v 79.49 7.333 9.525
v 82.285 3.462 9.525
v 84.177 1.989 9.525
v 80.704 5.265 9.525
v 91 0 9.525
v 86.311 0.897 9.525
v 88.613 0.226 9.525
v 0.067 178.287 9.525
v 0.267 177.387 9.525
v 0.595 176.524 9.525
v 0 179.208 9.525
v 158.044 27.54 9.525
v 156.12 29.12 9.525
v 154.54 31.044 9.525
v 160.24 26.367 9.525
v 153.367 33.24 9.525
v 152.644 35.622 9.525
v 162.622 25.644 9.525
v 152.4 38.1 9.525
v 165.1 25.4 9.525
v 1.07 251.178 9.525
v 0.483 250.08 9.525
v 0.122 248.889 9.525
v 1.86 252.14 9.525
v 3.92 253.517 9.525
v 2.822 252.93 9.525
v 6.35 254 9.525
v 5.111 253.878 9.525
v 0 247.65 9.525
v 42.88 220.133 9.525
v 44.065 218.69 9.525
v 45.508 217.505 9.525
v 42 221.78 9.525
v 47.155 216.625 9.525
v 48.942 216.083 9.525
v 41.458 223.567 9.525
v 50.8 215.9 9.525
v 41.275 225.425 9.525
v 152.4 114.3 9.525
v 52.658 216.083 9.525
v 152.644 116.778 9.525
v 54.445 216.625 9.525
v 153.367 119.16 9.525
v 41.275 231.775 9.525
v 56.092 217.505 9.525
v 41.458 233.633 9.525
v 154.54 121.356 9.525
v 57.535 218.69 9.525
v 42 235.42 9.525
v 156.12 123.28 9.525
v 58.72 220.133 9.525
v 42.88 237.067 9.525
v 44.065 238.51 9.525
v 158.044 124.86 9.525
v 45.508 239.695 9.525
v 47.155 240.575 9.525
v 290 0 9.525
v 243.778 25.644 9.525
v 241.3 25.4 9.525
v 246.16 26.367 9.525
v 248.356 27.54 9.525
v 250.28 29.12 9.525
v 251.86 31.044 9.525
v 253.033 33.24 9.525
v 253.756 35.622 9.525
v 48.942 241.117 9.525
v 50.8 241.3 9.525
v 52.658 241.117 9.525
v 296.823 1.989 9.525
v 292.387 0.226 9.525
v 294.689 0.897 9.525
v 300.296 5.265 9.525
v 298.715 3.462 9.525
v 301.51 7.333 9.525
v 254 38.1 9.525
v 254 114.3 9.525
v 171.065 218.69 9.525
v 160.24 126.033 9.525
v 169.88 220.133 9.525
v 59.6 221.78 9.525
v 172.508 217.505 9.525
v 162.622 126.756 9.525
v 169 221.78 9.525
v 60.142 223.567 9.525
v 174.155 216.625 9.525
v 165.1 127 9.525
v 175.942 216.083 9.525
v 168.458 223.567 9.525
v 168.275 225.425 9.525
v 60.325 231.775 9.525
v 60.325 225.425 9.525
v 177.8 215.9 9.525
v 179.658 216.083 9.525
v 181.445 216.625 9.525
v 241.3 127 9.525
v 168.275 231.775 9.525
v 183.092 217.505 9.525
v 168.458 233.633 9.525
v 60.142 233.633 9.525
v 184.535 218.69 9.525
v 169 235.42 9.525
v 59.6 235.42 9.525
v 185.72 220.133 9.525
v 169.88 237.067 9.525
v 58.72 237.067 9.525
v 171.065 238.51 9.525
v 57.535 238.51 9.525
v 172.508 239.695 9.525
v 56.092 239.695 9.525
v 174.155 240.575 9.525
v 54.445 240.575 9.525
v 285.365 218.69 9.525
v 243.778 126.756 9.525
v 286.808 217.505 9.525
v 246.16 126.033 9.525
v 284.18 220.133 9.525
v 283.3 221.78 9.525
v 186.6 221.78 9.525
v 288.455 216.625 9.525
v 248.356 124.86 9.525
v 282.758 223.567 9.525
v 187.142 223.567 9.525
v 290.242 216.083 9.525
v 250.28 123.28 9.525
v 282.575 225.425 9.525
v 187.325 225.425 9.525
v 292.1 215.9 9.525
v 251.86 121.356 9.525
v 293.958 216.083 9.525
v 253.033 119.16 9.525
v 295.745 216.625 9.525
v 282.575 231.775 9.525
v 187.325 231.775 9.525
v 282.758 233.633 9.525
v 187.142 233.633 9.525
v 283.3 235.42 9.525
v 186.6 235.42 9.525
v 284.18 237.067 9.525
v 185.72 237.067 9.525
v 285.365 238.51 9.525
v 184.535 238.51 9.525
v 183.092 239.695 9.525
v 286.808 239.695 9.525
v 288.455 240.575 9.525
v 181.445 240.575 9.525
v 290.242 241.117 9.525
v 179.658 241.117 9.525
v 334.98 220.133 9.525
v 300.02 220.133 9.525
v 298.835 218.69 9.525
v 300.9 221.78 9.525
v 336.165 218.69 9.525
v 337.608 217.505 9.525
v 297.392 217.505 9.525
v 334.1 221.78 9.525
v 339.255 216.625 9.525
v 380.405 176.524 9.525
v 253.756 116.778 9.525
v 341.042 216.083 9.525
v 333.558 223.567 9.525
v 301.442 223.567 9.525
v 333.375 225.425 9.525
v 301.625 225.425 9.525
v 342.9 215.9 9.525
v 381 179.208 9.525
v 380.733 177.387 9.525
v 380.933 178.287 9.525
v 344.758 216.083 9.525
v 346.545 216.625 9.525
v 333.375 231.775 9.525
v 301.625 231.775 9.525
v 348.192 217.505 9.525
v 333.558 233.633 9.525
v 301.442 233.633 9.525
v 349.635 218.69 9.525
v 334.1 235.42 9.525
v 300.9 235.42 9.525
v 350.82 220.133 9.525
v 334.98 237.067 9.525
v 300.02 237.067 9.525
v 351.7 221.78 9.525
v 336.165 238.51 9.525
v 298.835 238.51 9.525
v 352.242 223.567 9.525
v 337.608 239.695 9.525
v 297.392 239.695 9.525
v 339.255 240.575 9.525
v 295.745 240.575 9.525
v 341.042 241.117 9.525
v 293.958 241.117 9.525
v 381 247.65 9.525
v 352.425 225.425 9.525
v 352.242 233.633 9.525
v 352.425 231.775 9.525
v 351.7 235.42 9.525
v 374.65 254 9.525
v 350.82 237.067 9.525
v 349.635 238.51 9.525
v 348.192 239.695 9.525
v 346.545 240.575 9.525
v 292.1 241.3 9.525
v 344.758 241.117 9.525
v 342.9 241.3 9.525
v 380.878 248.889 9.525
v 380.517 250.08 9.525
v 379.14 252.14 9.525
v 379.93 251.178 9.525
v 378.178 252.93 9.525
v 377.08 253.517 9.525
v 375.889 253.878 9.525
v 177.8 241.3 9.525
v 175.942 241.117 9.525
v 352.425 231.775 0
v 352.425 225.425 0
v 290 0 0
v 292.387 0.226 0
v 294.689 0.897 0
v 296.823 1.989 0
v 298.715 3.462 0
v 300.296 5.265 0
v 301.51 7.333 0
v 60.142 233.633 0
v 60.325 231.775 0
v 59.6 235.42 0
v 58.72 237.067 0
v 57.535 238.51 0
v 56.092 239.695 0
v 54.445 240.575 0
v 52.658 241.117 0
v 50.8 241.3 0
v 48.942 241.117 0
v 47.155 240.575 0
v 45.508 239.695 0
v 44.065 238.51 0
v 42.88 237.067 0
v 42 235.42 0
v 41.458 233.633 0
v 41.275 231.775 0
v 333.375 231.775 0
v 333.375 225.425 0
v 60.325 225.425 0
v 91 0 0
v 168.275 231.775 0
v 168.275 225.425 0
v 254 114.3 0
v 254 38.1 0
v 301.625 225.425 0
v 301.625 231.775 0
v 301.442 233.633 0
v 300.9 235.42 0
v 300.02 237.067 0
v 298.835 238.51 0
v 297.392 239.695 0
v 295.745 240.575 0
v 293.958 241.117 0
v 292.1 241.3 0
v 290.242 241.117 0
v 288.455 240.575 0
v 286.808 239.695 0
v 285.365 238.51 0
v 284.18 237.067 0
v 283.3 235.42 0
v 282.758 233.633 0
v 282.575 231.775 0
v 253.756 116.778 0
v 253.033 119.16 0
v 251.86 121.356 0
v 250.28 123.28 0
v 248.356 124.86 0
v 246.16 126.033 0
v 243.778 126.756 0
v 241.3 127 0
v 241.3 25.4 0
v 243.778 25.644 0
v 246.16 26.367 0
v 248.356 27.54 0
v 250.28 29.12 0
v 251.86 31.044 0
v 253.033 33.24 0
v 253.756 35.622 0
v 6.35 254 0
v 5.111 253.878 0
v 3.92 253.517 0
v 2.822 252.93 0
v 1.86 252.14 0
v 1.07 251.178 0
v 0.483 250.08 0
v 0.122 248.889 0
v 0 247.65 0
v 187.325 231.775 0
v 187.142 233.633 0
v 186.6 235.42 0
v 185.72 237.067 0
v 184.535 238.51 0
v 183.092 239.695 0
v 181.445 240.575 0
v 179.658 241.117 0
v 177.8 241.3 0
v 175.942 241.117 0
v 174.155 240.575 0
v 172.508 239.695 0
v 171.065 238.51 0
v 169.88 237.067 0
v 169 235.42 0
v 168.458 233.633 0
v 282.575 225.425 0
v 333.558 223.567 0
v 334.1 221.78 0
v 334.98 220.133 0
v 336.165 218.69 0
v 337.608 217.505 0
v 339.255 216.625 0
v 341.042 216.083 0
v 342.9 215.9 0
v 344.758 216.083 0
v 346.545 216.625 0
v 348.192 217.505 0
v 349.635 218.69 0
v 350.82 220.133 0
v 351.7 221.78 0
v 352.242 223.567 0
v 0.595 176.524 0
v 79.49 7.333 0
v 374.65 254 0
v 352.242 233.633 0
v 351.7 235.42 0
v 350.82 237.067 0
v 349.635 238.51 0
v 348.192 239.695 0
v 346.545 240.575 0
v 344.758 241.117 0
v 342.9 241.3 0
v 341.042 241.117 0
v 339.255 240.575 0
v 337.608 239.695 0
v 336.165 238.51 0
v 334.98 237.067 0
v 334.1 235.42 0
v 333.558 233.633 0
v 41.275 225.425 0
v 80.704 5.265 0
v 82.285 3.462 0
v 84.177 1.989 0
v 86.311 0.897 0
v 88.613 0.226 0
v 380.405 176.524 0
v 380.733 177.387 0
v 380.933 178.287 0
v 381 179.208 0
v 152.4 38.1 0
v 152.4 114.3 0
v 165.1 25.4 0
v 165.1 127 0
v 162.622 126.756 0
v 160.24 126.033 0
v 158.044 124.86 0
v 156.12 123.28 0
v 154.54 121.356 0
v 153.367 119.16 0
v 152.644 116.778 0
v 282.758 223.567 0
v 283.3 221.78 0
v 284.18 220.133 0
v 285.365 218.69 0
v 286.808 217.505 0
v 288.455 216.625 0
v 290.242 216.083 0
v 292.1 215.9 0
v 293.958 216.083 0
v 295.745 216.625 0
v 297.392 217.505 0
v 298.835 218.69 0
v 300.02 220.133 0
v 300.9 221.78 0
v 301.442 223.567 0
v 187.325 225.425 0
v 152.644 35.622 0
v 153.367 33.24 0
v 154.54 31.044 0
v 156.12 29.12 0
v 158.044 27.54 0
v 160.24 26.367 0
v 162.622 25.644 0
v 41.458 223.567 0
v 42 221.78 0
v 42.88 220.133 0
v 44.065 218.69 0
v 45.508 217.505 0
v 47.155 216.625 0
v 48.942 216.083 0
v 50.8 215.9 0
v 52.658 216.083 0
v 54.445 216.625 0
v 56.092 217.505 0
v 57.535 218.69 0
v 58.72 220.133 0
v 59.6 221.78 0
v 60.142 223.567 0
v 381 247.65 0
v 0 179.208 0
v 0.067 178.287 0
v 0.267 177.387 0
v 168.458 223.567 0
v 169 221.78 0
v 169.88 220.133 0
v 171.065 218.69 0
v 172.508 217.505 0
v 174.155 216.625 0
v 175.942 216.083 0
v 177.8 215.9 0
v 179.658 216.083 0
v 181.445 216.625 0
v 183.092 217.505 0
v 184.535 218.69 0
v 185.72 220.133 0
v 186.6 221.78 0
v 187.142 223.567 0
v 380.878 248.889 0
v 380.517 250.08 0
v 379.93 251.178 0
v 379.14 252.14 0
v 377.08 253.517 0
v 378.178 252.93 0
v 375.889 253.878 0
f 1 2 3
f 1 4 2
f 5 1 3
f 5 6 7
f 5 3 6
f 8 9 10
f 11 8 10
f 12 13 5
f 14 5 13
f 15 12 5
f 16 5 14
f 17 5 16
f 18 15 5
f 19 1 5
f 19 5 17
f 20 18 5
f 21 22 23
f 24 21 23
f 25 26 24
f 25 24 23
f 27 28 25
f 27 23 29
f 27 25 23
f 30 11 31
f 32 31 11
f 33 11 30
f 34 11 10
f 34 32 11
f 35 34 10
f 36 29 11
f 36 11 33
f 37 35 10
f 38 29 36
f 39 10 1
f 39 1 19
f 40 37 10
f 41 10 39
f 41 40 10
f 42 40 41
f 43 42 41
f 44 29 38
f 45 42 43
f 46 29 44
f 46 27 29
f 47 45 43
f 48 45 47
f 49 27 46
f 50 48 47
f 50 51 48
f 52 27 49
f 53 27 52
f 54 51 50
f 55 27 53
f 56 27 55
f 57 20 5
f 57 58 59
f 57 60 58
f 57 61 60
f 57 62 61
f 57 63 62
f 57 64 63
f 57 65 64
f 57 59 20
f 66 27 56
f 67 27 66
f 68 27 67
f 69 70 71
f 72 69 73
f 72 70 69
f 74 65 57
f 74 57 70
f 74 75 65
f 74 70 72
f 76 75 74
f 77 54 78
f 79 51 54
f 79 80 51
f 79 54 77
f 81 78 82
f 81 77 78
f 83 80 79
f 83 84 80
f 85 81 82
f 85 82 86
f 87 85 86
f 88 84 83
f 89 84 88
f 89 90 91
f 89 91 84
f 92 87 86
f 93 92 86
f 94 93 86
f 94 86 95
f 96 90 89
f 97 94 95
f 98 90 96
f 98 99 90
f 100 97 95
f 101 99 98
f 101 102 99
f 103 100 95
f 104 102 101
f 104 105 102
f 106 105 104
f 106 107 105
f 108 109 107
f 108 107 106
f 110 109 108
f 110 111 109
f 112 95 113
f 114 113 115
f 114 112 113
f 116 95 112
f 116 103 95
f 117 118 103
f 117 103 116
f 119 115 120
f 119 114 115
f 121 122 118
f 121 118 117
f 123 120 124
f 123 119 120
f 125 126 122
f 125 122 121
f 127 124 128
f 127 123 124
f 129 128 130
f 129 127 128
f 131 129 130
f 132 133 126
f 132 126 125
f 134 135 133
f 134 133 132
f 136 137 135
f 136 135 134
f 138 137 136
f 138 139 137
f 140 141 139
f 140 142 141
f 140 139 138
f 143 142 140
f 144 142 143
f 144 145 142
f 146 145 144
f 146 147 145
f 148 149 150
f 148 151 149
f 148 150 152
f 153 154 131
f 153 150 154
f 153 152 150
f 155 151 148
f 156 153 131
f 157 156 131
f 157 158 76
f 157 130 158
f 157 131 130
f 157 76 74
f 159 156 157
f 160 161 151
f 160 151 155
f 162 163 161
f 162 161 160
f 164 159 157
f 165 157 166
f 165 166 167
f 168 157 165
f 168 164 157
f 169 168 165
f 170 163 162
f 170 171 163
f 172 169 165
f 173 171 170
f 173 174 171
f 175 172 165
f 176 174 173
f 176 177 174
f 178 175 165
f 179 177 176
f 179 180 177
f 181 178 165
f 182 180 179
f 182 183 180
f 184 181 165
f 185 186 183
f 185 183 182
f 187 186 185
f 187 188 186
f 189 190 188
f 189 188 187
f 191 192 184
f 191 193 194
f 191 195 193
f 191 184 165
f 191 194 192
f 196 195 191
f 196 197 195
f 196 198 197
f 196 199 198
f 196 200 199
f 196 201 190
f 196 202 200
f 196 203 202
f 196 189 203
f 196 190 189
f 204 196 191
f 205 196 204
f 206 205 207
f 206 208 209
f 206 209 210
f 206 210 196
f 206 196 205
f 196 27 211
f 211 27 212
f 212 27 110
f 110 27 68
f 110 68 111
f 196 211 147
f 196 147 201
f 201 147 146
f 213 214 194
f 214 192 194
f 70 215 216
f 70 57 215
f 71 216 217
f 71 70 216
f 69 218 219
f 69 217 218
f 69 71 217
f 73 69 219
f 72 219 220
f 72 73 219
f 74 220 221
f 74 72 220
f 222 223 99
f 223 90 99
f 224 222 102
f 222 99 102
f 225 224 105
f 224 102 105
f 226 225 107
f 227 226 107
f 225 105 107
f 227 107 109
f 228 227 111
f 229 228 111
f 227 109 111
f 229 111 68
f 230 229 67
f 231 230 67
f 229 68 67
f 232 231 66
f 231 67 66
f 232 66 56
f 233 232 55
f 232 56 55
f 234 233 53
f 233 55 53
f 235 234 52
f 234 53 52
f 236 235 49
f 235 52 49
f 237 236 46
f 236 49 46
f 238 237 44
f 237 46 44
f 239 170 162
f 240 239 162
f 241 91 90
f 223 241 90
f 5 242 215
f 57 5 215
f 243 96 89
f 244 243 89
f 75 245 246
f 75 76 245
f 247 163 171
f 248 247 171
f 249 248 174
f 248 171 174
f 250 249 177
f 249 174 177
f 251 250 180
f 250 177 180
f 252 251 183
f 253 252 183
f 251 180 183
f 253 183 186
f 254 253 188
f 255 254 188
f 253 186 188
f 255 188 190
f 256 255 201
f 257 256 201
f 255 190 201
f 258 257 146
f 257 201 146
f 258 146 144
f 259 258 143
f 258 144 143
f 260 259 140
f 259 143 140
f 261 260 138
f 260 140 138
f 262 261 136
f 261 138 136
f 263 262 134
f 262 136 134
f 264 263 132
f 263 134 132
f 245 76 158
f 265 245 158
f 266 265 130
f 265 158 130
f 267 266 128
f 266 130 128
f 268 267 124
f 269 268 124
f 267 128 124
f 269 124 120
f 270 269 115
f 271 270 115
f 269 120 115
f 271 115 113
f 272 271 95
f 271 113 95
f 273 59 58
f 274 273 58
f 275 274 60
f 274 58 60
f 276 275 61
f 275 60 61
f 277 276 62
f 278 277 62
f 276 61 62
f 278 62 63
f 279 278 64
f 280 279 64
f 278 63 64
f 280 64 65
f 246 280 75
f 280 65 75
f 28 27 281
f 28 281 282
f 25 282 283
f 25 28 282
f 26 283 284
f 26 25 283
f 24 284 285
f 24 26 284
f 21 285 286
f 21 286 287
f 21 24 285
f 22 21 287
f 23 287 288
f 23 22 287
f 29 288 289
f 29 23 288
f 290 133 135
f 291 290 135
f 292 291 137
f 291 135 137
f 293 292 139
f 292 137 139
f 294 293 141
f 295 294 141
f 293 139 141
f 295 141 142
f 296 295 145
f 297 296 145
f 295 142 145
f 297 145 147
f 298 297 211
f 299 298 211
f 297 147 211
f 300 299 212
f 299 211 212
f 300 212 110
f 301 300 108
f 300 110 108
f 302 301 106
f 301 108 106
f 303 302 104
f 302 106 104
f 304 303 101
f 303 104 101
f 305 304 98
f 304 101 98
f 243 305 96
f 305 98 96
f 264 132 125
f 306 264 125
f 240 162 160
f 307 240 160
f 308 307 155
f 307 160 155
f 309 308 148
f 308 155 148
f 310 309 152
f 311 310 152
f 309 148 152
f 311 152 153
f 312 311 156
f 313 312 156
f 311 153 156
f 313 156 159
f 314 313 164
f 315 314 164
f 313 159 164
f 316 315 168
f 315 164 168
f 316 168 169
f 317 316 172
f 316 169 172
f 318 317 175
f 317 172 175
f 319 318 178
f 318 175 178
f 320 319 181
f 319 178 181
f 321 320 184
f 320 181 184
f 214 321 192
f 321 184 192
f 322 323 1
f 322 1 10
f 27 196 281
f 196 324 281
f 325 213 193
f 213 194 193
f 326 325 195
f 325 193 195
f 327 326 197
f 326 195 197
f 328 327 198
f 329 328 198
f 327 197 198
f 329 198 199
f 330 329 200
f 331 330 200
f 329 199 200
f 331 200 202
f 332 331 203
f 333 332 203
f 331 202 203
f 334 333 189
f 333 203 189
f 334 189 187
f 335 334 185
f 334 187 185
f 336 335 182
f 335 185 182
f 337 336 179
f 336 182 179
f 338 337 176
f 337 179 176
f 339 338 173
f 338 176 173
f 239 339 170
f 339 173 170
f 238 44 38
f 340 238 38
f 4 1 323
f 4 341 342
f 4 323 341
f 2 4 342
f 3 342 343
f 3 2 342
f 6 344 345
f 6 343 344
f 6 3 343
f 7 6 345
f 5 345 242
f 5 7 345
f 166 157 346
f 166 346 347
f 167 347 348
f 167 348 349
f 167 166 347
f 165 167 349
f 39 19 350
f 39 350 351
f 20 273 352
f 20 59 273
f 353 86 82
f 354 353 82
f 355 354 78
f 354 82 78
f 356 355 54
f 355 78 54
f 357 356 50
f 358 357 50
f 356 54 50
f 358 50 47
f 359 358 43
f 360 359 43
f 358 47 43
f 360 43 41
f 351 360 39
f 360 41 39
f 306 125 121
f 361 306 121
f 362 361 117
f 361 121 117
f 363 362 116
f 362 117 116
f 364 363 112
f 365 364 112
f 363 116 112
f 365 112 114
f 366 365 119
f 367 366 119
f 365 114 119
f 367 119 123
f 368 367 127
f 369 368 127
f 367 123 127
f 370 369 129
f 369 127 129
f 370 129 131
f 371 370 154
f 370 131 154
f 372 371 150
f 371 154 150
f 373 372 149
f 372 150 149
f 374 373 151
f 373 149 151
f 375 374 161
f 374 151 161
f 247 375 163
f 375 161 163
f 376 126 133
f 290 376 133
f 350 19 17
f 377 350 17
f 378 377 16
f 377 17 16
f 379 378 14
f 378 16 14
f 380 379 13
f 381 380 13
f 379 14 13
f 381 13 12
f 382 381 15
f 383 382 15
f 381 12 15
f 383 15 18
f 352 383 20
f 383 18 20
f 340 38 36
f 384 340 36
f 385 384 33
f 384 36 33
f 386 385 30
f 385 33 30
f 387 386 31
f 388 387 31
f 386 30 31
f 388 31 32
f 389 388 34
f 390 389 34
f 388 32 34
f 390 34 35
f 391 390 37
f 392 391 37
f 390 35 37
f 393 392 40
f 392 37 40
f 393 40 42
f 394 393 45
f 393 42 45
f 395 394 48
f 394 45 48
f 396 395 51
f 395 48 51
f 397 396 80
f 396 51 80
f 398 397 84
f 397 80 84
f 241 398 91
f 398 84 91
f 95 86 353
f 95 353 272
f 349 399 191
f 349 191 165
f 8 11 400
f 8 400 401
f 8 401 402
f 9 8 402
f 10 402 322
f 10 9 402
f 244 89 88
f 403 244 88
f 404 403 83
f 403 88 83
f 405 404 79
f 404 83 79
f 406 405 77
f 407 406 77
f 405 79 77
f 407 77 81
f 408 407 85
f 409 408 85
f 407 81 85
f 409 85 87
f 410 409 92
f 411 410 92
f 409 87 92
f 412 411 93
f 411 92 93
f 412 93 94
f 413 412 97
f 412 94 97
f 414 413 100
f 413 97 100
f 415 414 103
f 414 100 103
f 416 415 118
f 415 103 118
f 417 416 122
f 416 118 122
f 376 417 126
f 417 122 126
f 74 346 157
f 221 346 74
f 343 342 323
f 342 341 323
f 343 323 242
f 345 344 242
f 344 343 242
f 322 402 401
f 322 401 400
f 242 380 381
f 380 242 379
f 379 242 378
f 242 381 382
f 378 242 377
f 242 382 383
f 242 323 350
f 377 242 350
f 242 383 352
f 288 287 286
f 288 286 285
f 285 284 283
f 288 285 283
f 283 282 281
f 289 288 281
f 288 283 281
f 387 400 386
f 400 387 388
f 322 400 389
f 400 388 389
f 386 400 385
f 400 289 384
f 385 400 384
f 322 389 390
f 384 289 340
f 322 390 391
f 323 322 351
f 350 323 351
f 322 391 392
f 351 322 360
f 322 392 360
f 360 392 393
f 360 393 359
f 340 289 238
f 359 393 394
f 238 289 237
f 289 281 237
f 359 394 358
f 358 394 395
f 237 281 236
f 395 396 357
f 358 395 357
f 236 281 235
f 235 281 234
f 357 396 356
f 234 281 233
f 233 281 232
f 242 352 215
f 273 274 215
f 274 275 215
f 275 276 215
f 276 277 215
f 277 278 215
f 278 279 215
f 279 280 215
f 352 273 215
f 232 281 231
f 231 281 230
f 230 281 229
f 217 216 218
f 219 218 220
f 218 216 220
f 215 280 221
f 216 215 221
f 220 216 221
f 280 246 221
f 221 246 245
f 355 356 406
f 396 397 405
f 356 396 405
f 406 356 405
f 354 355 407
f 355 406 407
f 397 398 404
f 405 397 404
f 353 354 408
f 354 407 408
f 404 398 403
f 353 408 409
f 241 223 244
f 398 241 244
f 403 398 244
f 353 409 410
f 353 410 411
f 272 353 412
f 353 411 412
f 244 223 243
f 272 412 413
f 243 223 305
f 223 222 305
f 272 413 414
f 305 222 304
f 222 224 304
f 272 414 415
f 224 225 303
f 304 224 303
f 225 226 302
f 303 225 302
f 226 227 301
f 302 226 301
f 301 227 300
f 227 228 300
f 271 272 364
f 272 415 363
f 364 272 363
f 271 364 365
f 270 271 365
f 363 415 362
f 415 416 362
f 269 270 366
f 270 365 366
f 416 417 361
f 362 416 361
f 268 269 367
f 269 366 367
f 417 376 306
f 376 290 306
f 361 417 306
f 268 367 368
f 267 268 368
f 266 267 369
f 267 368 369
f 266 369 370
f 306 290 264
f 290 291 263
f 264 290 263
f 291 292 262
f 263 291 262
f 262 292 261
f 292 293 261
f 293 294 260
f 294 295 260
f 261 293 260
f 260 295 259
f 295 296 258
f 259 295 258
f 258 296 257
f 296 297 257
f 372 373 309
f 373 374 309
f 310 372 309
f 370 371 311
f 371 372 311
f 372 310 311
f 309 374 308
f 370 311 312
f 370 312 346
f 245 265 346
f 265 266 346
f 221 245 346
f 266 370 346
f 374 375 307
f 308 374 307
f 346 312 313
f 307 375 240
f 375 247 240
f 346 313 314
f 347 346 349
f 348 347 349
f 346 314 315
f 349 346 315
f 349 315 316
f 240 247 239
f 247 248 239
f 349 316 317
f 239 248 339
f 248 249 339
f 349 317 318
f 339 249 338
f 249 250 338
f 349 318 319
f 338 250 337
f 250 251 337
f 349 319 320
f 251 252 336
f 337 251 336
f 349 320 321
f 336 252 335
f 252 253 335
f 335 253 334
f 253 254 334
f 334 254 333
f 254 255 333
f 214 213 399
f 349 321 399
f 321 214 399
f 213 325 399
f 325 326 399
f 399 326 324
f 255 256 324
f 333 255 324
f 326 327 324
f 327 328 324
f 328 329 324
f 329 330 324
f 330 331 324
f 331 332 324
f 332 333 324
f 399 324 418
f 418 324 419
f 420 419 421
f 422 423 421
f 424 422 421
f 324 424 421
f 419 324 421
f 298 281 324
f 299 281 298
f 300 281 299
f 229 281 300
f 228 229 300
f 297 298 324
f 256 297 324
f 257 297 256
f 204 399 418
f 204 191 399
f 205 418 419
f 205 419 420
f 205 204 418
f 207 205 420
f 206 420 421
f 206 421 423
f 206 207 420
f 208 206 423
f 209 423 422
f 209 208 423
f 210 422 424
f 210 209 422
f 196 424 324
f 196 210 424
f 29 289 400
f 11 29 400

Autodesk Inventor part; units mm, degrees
ref_plane "YZ Plane" through (0, 0, 0) normal (1, 0, 0) x (0, 1, 0)
ref_plane "XZ Plane" through (0, 0, 0) normal (0, 1, 0) x (-1, 0, 0)
ref_plane "XY Plane" through (0, 0, 0) normal (0, 0, 1) x (1, 0, 0)
sketch "Sketch1" plane through (0, 0, 0) normal (0, 0, 1) x (1, 0, 0)
  line L0 (0, 0) -> (298.0905, 0) construction
  line L1 (381, 254) -> (0, 254)
  line L2 (0, 254) -> (0, 0) construction
  line L3 (0, 254) -> (0, 0) construction
  line L4 (381, 254) -> (381, 177.8)
  line L5 (381, 177.8) -> (298.0905, 0)
  line L6 (0, 254) -> (0, 177.8)
  line L7 (82.9095, 0) -> (0, 177.8)
  line L8 (82.9095, 0) -> (298.0905, 0)
  dimension "d42" = 254
  dimension "d79" = 381
  dimension "d97" = 65
  dimension "d98" = 76.2
  dimension "d99" = 25
extrude "Plate1" add sketch "Sketch1" along normal blind 9.525
fillet "Corner Round1" radius 12.7 2 edges at (298.0905, 0, 4.7625) (82.9095, 0, 4.7625)
ref_plane "Work Plane1" through (0, 177.8, -13.208) normal (0, 1, 0) x (1, 0, 0)
sketch "Sketch10" plane through (0, 177.8, 9.525) normal (0, 0, 1) x (1, 0, 0)
  line L0 (342.9, 53.975) -> (342.9, 47.625) construction
  line L1 (333.375, 53.975) -> (333.375, 47.625)
  line L2 (352.425, 47.625) -> (352.425, 53.975)
  arc A0 (352.425, 53.975) -> (333.375, 53.975) centre (342.9, 53.975) ccw
  arc A1 (333.375, 47.625) -> (352.425, 47.625) centre (342.9, 47.625) ccw
  line L3 (50.8, 53.975) -> (50.8, 47.625) construction
  line L4 (41.275, 53.975) -> (41.275, 47.625)
  line L5 (60.325, 47.625) -> (60.325, 53.975)
  arc A2 (60.325, 53.975) -> (41.275, 53.975) centre (50.8, 53.975) ccw
  arc A3 (41.275, 47.625) -> (60.325, 47.625) centre (50.8, 47.625) ccw
  line L6 (0, 76.2) -> (381, 76.2) projected
  line L7 (381, 76.2) -> (381, 0) projected
  arc A4 (282.575, 47.625) -> (301.625, 47.625) centre (292.1, 47.625) ccw
  line L8 (282.575, 53.975) -> (282.575, 47.625)
  arc A5 (301.625, 53.975) -> (282.575, 53.975) centre (292.1, 53.975) ccw
  line L9 (301.625, 47.625) -> (301.625, 53.975)
  arc A6 (187.325, 53.975) -> (168.275, 53.975) centre (177.8, 53.975) ccw
  line L10 (187.325, 47.625) -> (187.325, 53.975)
  arc A7 (168.275, 47.625) -> (187.325, 47.625) centre (177.8, 47.625) ccw
  line L11 (168.275, 53.975) -> (168.275, 47.625)
  line L12 (0, 0) -> (0, 76.2) projected
  point P0 (342.9, 50.8)
  point P1 (50.8, 50.8)
  point P2 (41.275, 50.8)
  point P3 (168.275, 50.8)
  dimension "d83" = 19.05
  dimension "d85" = 6.35
  dimension "d100" = 25.4
  dimension "d101" = 38.1
  dimension "d104" = 50.8
  dimension "d111" = 127
  dimension "d116" = 50.8
extrude "Cut4" cut sketch "Sketch10" against normal blind 9.525
sketch "Sketch11" plane through (0, 0, 9.525) normal (0, 0, 1) x (1, 0, 0)
  line L0 (165.1, 127) -> (241.3, 127)
  line L1 (254, 114.3) -> (254, 38.1)
  line L2 (241.3, 25.4) -> (165.1, 25.4)
  line L3 (152.4, 38.1) -> (152.4, 114.3)
  line L4 (152.4, 127) -> (254, 25.4) construction
  line L5 (254, 127) -> (152.4, 25.4) construction
  arc A0 (254, 114.3) -> (241.3, 127) centre (241.3, 114.3) ccw
  arc A1 (165.1, 127) -> (152.4, 114.3) centre (165.1, 114.3) ccw
  arc A2 (152.4, 38.1) -> (165.1, 25.4) centre (165.1, 38.1) ccw
  arc A3 (241.3, 25.4) -> (254, 38.1) centre (241.3, 38.1) ccw
  line L6 (289.9997, 0) -> (0, 0) projected
  line L7 (0, 0) -> (0, 254) projected
  point P0 (203.2, 76.2)
  point P1 (12.7, 0)
  point P2 (0, 12.7)
  point P3 (0, 155.067)
  dimension "d90" = 101.6
  dimension "d91" = 101.6
  dimension "d92" = 12.7
  dimension "d93" = 25.4
  dimension "d94" = 152.4
extrude "Cut5" cut sketch "Sketch11" against normal blind 9.525
fillet "Corner Round4" radius 6.35 4 edges at (381, 254, 4.7625) (381, 177.8, 4.7625) (0, 254, 4.7625) (0, 177.8, 4.7625)
equation "\"d88\" = Thickness"
equation "\"d95\" = Thickness"
equation "\"d15\" = Thickness"
equation "\"BendReliefWidth\" = Thickness"
equation "\"BendReliefDepth\" = 0.5 * Thickness"
equation "\"CornerReliefSize\" = 4 * Thickness"
equation "\"MinimumRemnant\" = 2 * Thickness"
equation "\"TransitionRadius\" = BendRadius"
equation "\"JacobiRadiusSize\" = Thickness"
equation "\"GapSize\" = Thickness"
equation "\"Thickness\" = 9.525"
equation "\"BendRadius\" = 13.208"
properties part number "Front Hitch Model-1_Sheet-RH" material "SS304"
